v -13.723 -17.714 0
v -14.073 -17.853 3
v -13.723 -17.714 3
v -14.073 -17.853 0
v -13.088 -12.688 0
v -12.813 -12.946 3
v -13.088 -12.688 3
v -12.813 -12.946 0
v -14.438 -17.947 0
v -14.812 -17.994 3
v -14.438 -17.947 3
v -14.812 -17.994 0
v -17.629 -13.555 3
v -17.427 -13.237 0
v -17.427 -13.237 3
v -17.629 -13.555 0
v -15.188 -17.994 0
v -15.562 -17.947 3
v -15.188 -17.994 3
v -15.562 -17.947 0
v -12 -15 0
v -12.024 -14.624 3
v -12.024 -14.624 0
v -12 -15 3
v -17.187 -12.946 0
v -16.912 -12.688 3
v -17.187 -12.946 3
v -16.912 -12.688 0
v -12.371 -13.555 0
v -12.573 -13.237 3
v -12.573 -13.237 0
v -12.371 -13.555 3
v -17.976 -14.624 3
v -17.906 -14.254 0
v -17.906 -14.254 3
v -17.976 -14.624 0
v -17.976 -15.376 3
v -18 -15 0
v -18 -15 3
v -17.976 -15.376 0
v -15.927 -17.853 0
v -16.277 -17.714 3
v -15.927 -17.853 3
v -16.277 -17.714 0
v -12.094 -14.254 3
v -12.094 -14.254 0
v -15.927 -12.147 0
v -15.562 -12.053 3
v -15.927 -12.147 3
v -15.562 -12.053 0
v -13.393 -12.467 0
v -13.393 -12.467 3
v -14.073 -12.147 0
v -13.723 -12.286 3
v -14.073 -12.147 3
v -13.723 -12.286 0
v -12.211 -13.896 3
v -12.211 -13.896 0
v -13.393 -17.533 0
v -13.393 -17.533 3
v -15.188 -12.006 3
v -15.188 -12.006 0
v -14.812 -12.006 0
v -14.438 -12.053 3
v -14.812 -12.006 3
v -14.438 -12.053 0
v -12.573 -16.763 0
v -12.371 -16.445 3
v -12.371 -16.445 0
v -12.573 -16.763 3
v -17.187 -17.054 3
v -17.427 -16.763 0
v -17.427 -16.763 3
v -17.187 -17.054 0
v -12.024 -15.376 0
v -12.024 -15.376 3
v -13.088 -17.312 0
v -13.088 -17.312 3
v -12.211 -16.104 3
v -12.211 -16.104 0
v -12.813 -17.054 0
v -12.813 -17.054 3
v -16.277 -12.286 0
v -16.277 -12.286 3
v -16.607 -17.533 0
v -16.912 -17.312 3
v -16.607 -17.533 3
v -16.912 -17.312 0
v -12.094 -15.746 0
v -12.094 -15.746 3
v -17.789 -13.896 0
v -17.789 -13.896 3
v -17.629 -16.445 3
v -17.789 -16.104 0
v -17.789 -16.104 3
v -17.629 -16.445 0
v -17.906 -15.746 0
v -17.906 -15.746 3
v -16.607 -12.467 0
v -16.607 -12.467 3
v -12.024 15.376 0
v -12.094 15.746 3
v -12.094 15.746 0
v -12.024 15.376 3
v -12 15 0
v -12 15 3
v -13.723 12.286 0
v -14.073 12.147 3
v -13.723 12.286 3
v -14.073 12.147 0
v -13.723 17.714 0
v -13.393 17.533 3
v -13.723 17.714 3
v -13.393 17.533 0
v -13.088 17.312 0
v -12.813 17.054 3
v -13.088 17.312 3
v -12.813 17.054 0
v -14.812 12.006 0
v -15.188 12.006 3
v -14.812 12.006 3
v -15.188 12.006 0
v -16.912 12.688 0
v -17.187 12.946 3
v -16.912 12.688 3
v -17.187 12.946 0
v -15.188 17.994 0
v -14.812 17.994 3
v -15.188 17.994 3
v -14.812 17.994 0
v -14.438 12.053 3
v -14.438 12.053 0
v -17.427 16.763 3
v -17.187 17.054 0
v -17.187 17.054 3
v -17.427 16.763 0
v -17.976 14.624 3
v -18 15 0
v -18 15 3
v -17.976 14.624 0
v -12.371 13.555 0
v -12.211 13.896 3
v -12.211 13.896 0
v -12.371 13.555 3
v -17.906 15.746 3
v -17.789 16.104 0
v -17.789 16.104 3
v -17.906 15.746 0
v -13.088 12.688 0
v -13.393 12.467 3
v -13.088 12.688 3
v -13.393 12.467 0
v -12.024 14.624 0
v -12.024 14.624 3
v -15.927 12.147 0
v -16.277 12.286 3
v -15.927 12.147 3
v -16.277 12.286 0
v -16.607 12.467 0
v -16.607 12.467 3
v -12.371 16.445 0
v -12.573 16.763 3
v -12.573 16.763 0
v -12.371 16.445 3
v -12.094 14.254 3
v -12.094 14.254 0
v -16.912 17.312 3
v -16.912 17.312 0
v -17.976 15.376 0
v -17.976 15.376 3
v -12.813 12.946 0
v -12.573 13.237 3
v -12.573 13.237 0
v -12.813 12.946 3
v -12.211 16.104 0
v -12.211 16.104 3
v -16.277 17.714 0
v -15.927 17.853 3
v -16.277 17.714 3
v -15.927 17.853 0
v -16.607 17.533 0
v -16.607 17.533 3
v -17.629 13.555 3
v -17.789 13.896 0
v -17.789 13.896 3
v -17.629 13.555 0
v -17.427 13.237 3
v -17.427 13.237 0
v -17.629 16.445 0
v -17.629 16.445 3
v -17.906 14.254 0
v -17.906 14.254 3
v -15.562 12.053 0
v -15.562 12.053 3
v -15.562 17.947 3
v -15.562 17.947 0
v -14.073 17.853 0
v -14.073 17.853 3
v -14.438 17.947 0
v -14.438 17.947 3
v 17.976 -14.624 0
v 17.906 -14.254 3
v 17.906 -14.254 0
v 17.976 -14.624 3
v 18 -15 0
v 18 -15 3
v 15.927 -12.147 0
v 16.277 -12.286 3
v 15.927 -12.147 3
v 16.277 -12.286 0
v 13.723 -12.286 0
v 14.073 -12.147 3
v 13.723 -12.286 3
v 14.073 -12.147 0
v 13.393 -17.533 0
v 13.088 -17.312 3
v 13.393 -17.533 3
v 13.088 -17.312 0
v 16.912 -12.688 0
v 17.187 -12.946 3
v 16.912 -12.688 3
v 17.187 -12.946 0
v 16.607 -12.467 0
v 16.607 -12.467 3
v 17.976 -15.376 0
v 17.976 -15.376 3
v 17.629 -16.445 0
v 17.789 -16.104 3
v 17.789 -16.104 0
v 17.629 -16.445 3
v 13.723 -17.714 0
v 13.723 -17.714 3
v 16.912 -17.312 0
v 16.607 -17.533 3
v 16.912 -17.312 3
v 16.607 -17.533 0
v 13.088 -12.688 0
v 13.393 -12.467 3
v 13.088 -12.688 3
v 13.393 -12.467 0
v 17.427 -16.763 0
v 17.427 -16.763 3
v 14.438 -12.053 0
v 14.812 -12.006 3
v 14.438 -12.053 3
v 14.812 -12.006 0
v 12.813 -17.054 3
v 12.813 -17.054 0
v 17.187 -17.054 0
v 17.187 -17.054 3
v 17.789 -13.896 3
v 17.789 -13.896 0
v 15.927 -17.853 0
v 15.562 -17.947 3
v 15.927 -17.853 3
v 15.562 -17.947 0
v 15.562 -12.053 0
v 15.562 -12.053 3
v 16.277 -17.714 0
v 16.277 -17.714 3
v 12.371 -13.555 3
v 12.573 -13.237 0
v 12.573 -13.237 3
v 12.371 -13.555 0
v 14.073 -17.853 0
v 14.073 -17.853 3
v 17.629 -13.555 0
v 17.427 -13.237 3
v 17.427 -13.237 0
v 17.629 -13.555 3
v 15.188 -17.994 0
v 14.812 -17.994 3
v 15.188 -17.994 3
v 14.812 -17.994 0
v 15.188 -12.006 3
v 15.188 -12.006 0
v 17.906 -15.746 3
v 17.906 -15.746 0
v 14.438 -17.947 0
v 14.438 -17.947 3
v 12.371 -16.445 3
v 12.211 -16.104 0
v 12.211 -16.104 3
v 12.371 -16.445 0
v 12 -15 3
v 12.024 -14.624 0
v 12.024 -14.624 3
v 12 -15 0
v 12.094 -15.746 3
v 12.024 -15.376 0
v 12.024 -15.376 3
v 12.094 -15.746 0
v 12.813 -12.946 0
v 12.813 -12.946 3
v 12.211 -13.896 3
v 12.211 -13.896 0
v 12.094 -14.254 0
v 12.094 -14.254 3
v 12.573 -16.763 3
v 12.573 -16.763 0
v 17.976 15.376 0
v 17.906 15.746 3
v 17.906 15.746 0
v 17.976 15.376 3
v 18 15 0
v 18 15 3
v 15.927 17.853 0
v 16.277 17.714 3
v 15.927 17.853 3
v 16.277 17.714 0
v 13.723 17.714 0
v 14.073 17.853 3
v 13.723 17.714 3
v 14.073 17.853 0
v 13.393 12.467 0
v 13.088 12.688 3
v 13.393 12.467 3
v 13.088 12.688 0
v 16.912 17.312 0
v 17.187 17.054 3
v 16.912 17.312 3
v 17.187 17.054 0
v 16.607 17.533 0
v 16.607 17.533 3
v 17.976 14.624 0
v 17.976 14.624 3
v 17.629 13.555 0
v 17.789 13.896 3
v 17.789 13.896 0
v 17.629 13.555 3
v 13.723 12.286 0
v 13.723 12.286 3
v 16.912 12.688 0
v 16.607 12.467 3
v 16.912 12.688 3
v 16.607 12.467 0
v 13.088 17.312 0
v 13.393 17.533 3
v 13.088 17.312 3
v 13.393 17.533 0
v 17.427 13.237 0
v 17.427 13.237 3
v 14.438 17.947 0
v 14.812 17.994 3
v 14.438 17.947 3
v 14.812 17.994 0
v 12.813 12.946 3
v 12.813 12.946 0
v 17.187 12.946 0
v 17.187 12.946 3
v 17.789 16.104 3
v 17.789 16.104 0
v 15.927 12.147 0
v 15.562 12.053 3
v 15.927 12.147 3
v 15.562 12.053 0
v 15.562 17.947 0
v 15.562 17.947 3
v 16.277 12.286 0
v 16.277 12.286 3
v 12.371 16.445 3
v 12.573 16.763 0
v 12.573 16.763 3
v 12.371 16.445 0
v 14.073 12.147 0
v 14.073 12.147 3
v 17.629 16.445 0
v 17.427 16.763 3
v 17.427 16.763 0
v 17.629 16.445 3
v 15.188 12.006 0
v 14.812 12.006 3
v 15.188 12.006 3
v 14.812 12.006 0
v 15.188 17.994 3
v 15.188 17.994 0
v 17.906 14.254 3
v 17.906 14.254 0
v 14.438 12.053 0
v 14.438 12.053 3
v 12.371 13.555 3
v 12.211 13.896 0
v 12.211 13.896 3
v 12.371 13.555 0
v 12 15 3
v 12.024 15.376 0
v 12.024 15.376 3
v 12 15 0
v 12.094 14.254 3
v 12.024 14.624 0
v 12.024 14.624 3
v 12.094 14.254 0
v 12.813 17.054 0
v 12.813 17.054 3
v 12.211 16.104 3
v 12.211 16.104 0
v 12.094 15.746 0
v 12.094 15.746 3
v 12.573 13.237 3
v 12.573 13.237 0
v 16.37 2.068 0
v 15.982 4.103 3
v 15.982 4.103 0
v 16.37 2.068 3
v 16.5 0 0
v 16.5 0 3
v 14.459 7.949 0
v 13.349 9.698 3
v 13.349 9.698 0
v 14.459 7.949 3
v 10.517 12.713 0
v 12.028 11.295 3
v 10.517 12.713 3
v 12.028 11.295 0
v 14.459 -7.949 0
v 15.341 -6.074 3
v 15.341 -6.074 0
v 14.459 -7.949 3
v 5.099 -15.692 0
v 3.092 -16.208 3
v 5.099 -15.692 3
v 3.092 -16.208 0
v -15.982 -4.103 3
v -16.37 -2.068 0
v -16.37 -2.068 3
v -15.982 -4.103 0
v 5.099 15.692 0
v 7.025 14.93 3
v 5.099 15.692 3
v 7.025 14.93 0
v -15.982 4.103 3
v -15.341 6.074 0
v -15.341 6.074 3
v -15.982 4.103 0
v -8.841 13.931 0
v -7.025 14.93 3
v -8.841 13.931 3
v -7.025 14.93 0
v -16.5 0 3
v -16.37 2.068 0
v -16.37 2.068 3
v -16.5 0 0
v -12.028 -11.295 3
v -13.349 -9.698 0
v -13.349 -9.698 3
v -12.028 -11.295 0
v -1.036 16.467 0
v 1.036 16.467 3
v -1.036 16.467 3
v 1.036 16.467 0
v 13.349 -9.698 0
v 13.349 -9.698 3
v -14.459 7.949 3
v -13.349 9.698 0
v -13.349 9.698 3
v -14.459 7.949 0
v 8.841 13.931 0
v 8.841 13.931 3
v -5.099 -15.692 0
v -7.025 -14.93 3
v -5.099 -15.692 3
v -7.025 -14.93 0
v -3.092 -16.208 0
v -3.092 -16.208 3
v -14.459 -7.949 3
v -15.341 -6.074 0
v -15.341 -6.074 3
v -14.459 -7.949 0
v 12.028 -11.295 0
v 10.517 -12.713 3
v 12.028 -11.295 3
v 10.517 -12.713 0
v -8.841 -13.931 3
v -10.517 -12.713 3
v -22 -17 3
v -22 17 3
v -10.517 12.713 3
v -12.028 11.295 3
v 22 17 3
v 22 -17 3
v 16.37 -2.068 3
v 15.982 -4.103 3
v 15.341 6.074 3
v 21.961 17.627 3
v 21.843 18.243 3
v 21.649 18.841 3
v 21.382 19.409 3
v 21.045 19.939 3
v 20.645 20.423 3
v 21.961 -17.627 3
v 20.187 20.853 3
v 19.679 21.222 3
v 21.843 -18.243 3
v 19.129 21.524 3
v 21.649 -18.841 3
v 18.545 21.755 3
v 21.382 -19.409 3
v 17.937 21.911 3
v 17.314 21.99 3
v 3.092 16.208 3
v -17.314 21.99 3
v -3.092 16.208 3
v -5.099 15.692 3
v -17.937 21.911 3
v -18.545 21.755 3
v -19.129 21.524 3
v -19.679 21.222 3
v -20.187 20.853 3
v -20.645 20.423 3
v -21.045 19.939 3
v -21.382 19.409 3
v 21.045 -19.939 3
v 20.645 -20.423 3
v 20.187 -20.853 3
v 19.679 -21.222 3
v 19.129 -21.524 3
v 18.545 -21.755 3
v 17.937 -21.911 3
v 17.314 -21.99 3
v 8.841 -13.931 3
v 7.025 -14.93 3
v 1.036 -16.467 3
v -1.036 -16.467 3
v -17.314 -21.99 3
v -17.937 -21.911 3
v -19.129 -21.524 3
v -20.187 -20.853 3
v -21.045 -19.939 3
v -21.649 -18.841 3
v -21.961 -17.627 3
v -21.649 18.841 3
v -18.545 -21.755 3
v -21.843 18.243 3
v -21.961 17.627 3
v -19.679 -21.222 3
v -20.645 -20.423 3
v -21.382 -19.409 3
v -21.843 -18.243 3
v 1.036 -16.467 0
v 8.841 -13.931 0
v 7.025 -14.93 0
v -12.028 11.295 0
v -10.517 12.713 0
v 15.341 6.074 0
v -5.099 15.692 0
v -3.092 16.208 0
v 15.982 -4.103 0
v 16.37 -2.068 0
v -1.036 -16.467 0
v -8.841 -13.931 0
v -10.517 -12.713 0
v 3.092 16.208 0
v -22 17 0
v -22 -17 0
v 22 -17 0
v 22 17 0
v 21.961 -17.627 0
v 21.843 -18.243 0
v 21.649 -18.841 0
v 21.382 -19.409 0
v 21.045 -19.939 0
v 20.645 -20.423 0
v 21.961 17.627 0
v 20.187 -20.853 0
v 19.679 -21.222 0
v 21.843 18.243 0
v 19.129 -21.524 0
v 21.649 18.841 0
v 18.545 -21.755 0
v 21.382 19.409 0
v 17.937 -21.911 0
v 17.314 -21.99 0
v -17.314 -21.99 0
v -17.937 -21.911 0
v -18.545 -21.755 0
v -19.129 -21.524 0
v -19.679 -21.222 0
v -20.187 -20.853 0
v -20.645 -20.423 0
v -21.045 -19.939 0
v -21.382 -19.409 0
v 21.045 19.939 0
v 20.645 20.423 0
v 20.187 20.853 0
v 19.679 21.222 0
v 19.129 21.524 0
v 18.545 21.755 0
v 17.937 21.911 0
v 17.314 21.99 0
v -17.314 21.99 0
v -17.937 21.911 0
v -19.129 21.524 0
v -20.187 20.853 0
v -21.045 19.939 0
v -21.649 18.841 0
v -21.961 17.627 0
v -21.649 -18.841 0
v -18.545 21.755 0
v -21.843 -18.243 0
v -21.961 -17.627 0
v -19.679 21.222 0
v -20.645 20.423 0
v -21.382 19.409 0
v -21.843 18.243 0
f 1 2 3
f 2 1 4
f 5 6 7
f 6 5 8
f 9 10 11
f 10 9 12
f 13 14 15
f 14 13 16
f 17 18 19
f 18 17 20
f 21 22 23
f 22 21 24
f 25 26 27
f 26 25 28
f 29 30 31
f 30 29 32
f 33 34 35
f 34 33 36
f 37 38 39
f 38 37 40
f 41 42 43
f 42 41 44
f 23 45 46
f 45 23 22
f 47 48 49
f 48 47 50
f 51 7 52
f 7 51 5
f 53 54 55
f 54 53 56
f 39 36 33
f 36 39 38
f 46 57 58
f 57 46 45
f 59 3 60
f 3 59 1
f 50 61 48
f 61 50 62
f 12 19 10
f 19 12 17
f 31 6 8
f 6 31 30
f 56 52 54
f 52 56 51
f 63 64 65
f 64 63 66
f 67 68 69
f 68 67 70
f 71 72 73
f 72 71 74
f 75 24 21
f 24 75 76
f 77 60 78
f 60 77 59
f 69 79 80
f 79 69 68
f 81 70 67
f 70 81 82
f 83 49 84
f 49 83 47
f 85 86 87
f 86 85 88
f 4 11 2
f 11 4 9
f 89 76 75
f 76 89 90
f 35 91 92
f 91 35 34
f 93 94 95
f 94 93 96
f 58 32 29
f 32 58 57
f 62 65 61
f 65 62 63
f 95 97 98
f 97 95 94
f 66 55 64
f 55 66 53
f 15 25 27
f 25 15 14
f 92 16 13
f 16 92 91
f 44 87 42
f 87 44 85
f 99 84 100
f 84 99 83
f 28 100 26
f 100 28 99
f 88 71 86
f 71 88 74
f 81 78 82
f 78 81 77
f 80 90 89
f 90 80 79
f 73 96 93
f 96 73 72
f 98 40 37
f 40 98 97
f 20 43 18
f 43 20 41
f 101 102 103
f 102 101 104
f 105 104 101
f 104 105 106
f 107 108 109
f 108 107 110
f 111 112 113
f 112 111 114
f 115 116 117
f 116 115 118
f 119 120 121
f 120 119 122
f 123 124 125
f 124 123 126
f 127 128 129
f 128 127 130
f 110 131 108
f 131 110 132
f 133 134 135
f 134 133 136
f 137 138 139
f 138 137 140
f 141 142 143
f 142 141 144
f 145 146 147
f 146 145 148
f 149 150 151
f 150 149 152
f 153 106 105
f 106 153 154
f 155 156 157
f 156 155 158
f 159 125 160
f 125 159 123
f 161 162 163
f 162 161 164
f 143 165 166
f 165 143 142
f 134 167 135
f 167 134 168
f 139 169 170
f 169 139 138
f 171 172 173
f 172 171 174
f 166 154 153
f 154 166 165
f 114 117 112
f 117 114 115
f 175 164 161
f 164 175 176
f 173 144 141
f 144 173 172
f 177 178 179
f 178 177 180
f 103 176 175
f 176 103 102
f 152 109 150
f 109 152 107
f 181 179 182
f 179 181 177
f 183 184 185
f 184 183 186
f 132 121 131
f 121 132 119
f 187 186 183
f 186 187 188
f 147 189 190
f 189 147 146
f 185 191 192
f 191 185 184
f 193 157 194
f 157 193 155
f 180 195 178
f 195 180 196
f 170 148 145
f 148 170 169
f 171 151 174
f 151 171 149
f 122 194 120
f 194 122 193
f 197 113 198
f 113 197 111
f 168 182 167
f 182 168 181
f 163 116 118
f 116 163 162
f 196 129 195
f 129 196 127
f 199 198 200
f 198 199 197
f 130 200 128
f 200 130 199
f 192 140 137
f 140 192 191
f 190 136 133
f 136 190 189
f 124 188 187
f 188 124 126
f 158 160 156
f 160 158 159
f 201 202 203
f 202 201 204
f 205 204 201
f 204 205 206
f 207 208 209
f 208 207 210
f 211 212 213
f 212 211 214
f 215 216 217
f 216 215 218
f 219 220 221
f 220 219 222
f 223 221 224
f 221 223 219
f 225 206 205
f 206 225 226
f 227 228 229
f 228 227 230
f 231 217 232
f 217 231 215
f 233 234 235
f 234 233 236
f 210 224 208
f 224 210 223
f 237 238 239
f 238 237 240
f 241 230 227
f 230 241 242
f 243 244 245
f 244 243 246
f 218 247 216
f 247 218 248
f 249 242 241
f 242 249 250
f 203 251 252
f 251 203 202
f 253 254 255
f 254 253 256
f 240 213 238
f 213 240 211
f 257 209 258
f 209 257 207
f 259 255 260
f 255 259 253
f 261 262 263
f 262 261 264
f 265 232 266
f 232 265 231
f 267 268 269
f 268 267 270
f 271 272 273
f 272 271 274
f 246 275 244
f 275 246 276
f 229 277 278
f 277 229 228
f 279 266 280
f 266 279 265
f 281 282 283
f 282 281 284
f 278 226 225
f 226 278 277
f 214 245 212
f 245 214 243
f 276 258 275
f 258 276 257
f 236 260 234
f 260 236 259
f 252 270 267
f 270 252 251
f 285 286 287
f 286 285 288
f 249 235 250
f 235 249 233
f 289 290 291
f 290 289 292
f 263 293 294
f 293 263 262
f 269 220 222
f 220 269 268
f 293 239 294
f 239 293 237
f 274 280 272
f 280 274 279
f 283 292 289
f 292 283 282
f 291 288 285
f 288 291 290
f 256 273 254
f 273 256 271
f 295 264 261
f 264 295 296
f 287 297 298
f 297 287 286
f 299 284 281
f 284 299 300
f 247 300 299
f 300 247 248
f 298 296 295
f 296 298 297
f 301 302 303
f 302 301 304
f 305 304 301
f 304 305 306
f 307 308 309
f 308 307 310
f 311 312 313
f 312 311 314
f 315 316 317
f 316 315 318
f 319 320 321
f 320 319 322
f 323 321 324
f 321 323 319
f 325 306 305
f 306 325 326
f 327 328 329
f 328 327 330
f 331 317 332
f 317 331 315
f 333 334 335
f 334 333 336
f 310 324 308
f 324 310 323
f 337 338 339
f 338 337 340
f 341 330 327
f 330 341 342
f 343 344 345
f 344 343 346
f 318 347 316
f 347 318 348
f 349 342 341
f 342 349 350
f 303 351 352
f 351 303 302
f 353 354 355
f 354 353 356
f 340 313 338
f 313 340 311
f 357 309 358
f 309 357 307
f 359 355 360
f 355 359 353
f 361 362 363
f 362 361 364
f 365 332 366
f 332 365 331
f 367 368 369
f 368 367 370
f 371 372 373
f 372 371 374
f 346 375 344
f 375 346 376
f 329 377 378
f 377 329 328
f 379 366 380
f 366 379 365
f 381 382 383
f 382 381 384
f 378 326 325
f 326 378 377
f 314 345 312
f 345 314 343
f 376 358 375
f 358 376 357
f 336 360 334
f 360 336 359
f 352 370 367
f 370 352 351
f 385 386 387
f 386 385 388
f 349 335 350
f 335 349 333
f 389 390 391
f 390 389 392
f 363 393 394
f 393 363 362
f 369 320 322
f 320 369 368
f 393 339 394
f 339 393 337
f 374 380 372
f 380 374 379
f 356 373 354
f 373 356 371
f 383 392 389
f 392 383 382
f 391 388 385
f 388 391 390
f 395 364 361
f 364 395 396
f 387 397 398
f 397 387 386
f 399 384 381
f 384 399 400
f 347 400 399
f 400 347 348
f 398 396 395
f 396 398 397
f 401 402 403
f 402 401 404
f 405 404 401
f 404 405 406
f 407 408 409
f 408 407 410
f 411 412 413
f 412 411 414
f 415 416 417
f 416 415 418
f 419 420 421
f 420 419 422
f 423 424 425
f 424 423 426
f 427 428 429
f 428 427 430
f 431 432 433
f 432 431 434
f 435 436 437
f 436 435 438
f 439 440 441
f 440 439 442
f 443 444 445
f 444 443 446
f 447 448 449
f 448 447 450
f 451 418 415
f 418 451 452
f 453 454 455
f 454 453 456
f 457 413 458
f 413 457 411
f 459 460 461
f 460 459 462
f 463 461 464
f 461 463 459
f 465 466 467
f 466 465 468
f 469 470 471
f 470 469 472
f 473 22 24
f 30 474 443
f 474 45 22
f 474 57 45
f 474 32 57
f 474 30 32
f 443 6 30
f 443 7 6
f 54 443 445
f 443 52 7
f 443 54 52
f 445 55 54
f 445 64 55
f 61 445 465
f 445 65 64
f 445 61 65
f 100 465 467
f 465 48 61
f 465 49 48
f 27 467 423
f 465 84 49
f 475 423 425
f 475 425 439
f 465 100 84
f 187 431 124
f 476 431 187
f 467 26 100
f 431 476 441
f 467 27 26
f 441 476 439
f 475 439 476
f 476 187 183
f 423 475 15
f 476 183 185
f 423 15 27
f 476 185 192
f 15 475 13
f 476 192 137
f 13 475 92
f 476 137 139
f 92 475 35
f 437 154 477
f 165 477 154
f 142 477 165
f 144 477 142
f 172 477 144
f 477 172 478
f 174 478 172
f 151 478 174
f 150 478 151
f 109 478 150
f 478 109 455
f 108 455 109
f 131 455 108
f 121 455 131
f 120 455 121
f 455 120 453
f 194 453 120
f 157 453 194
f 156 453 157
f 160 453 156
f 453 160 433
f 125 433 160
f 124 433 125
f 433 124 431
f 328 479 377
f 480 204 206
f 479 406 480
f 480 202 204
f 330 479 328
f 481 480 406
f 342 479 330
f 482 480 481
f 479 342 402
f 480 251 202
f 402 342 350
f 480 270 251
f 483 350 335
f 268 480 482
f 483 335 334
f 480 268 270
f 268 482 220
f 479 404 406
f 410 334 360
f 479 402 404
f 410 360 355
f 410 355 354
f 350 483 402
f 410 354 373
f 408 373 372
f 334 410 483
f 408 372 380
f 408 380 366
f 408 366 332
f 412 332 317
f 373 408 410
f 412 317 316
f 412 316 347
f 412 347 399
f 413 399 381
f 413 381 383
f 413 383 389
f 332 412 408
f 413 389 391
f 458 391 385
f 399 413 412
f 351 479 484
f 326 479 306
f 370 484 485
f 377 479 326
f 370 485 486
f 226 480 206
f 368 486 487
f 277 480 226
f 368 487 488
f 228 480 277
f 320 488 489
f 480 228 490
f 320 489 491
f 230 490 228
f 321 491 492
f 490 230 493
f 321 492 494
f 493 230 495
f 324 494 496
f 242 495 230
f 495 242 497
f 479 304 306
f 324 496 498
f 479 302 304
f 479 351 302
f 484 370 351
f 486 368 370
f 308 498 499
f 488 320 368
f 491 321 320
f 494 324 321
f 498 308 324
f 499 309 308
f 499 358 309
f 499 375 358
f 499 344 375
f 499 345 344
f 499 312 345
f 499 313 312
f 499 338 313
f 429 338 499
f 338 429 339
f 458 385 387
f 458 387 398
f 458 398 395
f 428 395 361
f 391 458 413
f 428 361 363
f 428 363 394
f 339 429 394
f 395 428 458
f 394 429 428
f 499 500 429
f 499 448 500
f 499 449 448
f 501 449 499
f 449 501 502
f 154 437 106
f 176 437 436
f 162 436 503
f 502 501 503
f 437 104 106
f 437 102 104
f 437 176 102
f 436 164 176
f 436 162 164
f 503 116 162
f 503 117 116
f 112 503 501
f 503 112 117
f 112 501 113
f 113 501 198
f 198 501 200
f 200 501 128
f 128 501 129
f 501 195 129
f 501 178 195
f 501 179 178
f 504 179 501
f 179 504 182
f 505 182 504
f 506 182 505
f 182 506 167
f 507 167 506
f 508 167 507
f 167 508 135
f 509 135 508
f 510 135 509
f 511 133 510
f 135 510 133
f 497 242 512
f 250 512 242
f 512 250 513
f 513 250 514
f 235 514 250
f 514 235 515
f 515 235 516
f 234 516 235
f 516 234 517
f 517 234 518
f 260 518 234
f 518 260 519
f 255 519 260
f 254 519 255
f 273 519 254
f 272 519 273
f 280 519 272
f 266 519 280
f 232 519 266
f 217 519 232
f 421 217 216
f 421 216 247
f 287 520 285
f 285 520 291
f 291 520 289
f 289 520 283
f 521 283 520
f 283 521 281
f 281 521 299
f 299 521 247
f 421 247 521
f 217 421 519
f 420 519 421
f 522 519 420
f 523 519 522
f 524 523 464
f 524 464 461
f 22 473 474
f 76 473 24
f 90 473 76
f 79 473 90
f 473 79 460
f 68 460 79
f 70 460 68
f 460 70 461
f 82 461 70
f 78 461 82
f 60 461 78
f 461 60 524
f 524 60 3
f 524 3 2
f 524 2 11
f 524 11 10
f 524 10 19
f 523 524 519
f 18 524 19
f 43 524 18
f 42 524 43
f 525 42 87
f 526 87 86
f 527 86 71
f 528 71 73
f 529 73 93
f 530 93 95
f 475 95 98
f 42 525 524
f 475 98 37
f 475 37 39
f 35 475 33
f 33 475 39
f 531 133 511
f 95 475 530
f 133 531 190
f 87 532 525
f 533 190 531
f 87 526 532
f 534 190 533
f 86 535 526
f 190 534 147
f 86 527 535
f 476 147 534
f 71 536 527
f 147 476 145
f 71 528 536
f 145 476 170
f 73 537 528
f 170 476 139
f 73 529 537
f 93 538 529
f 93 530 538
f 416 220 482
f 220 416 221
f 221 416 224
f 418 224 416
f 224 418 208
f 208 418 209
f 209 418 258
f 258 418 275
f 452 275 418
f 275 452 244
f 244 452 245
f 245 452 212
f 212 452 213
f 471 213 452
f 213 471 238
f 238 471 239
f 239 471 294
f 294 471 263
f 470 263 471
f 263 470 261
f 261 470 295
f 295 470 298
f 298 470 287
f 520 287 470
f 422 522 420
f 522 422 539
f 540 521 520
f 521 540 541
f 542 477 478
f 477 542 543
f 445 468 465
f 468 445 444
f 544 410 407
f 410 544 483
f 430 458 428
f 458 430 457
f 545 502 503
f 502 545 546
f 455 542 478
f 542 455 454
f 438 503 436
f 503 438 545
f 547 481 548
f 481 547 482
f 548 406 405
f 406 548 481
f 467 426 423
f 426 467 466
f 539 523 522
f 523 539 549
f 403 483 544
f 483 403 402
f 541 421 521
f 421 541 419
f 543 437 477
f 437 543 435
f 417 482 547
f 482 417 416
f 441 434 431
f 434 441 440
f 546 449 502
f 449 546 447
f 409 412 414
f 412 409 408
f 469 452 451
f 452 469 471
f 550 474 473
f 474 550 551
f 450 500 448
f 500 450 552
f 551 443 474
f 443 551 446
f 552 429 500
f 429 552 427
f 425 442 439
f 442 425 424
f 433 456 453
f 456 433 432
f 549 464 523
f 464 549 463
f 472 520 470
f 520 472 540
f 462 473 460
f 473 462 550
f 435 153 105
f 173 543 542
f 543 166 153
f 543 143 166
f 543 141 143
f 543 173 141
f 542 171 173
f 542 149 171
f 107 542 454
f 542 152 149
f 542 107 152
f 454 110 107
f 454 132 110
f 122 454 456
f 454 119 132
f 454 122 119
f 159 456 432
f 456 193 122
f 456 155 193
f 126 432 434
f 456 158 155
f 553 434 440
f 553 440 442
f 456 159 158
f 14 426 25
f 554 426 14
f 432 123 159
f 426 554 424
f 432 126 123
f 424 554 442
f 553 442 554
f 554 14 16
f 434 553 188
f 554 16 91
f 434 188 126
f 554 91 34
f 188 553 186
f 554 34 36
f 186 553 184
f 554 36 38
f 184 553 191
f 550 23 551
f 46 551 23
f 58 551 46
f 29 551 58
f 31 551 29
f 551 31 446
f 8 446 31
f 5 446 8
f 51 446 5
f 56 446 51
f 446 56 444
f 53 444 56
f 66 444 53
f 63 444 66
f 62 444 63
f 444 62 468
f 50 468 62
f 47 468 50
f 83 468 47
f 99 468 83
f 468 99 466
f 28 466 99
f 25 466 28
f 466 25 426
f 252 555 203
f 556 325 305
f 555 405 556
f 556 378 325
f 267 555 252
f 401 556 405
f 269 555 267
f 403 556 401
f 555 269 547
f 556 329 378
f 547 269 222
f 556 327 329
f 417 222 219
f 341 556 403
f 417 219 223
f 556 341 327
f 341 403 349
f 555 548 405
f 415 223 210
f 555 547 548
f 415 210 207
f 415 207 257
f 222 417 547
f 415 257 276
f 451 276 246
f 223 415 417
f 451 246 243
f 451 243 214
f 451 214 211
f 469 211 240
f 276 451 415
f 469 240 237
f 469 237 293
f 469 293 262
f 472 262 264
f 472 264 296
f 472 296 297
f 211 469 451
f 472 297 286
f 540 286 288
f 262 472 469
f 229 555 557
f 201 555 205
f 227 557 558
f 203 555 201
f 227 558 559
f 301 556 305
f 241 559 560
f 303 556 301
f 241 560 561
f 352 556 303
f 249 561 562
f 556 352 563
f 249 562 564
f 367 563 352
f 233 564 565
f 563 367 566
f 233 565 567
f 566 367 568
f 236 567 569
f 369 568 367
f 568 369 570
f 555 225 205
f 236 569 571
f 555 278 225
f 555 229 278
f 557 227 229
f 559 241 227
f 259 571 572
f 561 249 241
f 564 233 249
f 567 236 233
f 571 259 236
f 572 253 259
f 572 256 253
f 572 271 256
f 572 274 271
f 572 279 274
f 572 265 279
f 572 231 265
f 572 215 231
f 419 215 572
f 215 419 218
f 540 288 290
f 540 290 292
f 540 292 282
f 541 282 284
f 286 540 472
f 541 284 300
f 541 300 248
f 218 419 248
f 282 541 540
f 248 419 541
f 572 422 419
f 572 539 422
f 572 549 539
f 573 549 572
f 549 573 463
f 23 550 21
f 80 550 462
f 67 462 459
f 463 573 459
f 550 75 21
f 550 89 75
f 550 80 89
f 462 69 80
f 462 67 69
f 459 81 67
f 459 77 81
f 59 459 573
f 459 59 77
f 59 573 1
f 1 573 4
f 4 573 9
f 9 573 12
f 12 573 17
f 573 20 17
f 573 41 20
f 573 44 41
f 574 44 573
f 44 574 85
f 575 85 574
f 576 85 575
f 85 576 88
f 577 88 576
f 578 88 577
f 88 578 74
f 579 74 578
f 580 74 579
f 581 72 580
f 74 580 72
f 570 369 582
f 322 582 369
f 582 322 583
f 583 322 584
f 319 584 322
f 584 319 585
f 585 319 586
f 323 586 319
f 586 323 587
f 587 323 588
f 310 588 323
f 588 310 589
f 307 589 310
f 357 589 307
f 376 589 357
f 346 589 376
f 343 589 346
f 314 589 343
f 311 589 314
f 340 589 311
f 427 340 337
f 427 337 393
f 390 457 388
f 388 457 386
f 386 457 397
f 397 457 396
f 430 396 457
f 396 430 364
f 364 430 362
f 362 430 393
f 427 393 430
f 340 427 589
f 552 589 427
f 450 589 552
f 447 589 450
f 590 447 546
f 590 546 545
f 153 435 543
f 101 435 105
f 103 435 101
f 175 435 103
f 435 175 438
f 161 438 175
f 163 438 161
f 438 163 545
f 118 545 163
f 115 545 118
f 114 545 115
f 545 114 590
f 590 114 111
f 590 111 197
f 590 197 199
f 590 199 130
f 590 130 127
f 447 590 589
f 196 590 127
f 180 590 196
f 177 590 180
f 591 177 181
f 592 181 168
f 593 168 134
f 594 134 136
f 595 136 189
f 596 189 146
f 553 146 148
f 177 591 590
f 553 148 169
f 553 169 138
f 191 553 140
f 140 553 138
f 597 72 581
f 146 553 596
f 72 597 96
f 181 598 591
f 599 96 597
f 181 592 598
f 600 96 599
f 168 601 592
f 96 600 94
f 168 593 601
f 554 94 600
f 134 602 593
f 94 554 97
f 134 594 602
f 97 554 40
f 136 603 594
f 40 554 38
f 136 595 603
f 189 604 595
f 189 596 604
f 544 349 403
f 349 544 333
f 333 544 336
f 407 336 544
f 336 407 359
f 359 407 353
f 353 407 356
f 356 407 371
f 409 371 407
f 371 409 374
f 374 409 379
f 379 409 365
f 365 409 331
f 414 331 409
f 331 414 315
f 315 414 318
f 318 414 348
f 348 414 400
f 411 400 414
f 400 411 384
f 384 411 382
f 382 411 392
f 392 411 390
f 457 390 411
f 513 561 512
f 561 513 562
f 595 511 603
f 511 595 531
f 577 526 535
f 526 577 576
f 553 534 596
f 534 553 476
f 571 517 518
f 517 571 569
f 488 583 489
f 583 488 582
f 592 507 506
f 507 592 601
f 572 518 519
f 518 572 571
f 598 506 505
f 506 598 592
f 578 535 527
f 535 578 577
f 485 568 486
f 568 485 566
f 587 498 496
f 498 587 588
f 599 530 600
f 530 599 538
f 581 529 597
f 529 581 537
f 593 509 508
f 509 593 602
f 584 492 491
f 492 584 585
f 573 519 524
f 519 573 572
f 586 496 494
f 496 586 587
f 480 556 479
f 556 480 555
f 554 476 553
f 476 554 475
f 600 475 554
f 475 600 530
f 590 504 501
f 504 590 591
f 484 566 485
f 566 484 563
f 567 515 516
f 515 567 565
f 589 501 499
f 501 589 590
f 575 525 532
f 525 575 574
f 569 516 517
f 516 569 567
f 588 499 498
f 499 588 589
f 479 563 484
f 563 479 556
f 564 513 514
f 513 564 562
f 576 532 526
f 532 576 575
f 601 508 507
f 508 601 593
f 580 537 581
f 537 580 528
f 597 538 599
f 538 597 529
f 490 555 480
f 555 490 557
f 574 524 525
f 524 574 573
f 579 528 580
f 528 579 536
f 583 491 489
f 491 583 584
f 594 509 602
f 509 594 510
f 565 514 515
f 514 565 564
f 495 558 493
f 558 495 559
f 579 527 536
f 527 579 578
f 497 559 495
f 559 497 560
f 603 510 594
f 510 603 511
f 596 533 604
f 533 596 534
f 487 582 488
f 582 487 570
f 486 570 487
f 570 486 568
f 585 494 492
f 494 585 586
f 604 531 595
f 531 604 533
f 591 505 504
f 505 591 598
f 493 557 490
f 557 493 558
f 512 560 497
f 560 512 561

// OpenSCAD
$fn = 50;


difference() {
	union() {
		hull() {
			translate(v = [-17.0000000000, 17.0000000000, 0]) {
				cylinder(h = 3, r = 5);
			}
			translate(v = [17.0000000000, 17.0000000000, 0]) {
				cylinder(h = 3, r = 5);
			}
			translate(v = [-17.0000000000, -17.0000000000, 0]) {
				cylinder(h = 3, r = 5);
			}
			translate(v = [17.0000000000, -17.0000000000, 0]) {
				cylinder(h = 3, r = 5);
			}
		}
	}
	union() {
		#translate(v = [-15.0000000000, -15.0000000000, -100.0000000000]) {
			cylinder(h = 200, r = 3.0000000000);
		}
		#translate(v = [-15.0000000000, 15.0000000000, -100.0000000000]) {
			cylinder(h = 200, r = 3.0000000000);
		}
		#translate(v = [15.0000000000, -15.0000000000, -100.0000000000]) {
			cylinder(h = 200, r = 3.0000000000);
		}
		#translate(v = [15.0000000000, 15.0000000000, -100.0000000000]) {
			cylinder(h = 200, r = 3.0000000000);
		}
		#cylinder(h = 3, r = 16.5000000000);
	}
}
